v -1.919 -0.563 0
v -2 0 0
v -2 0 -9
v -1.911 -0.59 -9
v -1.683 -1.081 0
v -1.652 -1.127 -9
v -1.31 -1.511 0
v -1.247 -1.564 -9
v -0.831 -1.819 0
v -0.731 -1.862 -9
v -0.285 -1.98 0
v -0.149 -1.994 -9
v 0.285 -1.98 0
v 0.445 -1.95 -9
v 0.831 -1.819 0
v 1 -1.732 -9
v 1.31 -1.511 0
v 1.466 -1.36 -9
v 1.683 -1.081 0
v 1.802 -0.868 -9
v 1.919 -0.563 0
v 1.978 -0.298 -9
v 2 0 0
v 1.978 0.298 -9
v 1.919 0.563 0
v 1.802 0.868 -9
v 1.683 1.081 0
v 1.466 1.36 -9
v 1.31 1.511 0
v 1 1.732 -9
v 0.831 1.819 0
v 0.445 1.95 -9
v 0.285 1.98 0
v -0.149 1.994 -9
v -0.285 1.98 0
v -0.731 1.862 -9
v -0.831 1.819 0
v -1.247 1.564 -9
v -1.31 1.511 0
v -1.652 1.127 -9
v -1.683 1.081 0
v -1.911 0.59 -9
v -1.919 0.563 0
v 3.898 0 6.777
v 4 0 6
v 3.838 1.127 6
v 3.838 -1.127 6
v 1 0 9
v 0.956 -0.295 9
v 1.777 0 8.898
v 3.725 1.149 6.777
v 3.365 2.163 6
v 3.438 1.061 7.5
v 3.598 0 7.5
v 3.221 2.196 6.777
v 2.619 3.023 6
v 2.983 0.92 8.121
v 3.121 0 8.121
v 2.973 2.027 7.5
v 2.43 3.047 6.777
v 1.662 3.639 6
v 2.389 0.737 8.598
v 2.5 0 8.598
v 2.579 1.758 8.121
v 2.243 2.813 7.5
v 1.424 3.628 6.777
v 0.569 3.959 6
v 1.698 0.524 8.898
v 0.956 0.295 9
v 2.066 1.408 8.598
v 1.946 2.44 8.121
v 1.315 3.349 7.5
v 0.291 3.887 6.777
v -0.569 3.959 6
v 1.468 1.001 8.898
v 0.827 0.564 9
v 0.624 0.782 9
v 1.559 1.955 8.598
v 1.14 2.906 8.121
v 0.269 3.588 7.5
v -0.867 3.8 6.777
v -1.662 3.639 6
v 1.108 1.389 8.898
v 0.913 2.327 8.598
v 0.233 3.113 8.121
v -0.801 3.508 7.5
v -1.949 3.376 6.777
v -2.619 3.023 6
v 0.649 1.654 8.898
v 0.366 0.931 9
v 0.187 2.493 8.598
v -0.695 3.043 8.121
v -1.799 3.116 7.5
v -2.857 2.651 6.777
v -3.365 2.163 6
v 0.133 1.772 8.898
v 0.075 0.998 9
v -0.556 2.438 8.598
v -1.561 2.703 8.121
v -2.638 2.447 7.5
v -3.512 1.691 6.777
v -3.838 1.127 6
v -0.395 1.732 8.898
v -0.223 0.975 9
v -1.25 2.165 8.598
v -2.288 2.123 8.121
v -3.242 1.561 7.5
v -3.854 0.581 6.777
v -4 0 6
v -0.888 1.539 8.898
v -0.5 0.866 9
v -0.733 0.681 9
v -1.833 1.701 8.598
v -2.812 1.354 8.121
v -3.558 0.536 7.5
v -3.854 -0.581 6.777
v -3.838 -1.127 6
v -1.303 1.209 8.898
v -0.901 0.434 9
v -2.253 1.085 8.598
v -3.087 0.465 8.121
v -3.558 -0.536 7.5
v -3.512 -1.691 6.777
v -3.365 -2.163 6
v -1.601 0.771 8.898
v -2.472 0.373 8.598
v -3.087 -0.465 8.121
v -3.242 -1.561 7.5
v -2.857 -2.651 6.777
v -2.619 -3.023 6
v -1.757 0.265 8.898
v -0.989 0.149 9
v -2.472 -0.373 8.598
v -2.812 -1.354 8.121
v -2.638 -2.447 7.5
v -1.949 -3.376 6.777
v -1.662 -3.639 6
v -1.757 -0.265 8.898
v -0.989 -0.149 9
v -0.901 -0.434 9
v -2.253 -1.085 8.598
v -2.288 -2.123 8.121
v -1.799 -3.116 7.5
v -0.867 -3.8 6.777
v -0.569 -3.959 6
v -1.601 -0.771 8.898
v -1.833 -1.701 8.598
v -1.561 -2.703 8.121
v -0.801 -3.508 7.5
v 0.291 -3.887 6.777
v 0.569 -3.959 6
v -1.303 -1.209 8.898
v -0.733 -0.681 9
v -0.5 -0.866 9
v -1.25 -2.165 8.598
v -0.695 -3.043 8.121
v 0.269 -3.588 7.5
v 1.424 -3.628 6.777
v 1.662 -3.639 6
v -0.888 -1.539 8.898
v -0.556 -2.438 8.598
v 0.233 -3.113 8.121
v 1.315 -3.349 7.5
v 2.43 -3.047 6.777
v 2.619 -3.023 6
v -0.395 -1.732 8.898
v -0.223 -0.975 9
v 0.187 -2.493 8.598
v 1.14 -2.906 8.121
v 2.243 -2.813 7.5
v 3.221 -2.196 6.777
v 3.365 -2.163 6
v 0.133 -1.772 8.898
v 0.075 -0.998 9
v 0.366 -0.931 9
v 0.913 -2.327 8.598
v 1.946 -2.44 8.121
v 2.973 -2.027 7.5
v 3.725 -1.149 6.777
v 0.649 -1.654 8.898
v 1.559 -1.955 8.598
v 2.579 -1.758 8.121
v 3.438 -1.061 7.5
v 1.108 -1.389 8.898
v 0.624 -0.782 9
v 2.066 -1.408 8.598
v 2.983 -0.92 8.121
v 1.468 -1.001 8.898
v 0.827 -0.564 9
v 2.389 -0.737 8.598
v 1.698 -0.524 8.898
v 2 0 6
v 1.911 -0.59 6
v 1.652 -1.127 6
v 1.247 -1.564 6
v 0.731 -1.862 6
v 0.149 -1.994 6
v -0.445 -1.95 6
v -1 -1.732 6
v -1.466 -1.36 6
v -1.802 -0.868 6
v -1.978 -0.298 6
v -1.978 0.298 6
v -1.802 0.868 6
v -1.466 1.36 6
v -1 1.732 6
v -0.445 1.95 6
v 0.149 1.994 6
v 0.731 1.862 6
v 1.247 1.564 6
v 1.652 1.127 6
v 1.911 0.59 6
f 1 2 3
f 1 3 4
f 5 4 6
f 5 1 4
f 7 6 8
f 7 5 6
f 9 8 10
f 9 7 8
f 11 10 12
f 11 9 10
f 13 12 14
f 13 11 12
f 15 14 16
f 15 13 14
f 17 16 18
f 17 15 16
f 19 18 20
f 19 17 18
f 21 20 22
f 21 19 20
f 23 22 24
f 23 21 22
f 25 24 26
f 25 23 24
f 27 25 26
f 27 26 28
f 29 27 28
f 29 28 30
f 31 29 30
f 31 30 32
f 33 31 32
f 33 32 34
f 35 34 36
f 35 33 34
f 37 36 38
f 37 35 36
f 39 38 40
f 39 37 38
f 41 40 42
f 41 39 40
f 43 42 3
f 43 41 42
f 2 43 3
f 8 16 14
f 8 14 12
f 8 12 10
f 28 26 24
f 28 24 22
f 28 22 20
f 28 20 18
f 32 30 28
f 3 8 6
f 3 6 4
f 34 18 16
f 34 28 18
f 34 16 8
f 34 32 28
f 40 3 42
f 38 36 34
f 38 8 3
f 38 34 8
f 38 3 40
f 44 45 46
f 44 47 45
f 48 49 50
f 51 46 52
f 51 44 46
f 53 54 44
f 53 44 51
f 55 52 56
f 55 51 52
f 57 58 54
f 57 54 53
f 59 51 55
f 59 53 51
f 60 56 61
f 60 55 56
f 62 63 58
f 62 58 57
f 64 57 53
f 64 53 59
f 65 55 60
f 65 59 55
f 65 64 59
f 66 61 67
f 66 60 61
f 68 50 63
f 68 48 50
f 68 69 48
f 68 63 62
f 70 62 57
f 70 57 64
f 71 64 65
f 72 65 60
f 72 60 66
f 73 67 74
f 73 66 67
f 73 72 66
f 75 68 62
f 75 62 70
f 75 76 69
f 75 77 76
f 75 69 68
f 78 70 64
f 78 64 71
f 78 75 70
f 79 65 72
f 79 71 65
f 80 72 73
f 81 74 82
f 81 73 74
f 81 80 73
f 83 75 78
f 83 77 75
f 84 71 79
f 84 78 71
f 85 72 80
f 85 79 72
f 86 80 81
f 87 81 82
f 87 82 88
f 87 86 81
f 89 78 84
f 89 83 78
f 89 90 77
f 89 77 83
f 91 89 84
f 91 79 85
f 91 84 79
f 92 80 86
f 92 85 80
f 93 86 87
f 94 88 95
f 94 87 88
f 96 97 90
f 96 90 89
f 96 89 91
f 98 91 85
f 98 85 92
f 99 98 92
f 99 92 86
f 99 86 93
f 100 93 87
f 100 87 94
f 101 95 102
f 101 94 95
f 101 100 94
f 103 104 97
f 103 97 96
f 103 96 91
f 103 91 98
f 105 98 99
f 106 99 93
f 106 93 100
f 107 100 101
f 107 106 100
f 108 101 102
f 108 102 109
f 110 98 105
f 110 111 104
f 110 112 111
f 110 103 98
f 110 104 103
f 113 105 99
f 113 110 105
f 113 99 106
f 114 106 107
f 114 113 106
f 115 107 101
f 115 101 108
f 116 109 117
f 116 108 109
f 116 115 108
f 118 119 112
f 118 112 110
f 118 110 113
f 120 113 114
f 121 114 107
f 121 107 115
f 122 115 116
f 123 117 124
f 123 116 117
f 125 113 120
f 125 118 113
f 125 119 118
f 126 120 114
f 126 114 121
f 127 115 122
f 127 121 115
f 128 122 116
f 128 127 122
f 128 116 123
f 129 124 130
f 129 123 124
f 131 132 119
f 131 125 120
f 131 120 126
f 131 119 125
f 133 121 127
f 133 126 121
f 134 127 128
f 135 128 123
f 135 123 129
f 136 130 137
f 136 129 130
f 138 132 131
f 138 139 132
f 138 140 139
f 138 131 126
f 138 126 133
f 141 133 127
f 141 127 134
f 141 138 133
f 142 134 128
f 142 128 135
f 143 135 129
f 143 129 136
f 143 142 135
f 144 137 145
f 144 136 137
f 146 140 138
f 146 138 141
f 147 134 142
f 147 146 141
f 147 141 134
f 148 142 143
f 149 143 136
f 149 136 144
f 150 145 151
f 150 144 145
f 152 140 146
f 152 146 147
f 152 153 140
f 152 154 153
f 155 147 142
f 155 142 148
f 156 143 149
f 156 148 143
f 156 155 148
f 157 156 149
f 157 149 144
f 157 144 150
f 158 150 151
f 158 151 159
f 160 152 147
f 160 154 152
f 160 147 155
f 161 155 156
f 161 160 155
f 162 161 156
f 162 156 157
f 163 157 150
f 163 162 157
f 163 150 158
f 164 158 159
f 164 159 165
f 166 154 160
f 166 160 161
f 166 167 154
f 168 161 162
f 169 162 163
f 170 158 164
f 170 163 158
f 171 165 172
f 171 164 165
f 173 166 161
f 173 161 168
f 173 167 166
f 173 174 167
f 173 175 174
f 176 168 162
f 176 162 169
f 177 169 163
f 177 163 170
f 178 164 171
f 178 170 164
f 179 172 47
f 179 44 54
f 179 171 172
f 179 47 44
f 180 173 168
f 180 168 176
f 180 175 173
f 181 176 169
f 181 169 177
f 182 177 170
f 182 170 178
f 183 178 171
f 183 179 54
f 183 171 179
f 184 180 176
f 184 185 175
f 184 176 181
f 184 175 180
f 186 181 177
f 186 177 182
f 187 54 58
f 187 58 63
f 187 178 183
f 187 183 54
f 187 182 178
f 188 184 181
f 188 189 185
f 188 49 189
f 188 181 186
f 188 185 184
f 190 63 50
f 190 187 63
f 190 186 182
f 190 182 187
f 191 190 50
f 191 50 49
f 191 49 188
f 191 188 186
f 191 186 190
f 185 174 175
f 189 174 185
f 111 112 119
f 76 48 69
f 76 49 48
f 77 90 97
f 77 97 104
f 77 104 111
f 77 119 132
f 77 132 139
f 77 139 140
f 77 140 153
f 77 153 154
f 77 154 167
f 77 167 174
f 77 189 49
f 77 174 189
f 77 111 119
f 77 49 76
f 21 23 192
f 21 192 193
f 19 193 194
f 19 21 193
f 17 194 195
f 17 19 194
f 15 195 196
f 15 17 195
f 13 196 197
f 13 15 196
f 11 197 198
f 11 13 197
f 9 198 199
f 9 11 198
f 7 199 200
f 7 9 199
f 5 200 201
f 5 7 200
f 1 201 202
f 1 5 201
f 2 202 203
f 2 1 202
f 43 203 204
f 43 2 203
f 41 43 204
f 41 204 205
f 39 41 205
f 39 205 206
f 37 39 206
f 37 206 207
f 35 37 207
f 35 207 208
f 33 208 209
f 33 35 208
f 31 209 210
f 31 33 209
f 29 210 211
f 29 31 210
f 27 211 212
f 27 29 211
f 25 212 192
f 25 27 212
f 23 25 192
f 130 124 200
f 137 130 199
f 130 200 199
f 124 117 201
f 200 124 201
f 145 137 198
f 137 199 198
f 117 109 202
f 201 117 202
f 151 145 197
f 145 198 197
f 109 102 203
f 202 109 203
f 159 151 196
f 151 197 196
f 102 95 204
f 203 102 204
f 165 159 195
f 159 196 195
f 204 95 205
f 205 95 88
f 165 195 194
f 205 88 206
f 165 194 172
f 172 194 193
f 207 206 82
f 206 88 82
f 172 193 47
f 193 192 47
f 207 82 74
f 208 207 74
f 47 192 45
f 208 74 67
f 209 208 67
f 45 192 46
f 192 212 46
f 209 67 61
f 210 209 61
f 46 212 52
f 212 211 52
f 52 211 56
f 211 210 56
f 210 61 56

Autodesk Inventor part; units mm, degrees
ref_plane "YZ Plane" through (0, 0, 0) normal (1, 0, 0) x (0, 1, 0)
ref_plane "XZ Plane" through (0, 0, 0) normal (0, 1, 0) x (-1, 0, 0)
ref_plane "XY Plane" through (0, 0, 0) normal (0, 0, 1) x (1, 0, 0)
sketch "スケッチ1" plane through (0, 0, 0) normal (0, 0, 1) x (1, 0, 0)
  circle A0 centre (0, 0) radius 2
  dimension "d0" = 4
extrude "押し出し1" add sketch "スケッチ1" along normal blind 6
sketch "スケッチ2" plane through (0, 0, 6) normal (0, 0, 1) x (1, 0, 0)
  circle A0 centre (0, 0) radius 2 projected
  circle A1 centre (0, 0) radius 4
  dimension "d3" = 8
extrude "押し出し2" add sketch "スケッチ2" along normal blind 3 contours A0 | A1
fillet "フィレット1" radius 3 1 edges at (-4, 0, 9)
thread "ねじ1" size "M4x0.7" class "6g" standard "ANSI Metric M Profile" full length
sketch "スケッチ3" plane through (0, 0, 0) normal (0, 0, -1) x (-1, 0, 0)
  circle A0 centre (0, 0) radius 2
extrude "押し出し3" add sketch "スケッチ3" along normal blind 9
properties part number "SB　M4 15mm なべネジ" material "Stainless Steel, 440C"
